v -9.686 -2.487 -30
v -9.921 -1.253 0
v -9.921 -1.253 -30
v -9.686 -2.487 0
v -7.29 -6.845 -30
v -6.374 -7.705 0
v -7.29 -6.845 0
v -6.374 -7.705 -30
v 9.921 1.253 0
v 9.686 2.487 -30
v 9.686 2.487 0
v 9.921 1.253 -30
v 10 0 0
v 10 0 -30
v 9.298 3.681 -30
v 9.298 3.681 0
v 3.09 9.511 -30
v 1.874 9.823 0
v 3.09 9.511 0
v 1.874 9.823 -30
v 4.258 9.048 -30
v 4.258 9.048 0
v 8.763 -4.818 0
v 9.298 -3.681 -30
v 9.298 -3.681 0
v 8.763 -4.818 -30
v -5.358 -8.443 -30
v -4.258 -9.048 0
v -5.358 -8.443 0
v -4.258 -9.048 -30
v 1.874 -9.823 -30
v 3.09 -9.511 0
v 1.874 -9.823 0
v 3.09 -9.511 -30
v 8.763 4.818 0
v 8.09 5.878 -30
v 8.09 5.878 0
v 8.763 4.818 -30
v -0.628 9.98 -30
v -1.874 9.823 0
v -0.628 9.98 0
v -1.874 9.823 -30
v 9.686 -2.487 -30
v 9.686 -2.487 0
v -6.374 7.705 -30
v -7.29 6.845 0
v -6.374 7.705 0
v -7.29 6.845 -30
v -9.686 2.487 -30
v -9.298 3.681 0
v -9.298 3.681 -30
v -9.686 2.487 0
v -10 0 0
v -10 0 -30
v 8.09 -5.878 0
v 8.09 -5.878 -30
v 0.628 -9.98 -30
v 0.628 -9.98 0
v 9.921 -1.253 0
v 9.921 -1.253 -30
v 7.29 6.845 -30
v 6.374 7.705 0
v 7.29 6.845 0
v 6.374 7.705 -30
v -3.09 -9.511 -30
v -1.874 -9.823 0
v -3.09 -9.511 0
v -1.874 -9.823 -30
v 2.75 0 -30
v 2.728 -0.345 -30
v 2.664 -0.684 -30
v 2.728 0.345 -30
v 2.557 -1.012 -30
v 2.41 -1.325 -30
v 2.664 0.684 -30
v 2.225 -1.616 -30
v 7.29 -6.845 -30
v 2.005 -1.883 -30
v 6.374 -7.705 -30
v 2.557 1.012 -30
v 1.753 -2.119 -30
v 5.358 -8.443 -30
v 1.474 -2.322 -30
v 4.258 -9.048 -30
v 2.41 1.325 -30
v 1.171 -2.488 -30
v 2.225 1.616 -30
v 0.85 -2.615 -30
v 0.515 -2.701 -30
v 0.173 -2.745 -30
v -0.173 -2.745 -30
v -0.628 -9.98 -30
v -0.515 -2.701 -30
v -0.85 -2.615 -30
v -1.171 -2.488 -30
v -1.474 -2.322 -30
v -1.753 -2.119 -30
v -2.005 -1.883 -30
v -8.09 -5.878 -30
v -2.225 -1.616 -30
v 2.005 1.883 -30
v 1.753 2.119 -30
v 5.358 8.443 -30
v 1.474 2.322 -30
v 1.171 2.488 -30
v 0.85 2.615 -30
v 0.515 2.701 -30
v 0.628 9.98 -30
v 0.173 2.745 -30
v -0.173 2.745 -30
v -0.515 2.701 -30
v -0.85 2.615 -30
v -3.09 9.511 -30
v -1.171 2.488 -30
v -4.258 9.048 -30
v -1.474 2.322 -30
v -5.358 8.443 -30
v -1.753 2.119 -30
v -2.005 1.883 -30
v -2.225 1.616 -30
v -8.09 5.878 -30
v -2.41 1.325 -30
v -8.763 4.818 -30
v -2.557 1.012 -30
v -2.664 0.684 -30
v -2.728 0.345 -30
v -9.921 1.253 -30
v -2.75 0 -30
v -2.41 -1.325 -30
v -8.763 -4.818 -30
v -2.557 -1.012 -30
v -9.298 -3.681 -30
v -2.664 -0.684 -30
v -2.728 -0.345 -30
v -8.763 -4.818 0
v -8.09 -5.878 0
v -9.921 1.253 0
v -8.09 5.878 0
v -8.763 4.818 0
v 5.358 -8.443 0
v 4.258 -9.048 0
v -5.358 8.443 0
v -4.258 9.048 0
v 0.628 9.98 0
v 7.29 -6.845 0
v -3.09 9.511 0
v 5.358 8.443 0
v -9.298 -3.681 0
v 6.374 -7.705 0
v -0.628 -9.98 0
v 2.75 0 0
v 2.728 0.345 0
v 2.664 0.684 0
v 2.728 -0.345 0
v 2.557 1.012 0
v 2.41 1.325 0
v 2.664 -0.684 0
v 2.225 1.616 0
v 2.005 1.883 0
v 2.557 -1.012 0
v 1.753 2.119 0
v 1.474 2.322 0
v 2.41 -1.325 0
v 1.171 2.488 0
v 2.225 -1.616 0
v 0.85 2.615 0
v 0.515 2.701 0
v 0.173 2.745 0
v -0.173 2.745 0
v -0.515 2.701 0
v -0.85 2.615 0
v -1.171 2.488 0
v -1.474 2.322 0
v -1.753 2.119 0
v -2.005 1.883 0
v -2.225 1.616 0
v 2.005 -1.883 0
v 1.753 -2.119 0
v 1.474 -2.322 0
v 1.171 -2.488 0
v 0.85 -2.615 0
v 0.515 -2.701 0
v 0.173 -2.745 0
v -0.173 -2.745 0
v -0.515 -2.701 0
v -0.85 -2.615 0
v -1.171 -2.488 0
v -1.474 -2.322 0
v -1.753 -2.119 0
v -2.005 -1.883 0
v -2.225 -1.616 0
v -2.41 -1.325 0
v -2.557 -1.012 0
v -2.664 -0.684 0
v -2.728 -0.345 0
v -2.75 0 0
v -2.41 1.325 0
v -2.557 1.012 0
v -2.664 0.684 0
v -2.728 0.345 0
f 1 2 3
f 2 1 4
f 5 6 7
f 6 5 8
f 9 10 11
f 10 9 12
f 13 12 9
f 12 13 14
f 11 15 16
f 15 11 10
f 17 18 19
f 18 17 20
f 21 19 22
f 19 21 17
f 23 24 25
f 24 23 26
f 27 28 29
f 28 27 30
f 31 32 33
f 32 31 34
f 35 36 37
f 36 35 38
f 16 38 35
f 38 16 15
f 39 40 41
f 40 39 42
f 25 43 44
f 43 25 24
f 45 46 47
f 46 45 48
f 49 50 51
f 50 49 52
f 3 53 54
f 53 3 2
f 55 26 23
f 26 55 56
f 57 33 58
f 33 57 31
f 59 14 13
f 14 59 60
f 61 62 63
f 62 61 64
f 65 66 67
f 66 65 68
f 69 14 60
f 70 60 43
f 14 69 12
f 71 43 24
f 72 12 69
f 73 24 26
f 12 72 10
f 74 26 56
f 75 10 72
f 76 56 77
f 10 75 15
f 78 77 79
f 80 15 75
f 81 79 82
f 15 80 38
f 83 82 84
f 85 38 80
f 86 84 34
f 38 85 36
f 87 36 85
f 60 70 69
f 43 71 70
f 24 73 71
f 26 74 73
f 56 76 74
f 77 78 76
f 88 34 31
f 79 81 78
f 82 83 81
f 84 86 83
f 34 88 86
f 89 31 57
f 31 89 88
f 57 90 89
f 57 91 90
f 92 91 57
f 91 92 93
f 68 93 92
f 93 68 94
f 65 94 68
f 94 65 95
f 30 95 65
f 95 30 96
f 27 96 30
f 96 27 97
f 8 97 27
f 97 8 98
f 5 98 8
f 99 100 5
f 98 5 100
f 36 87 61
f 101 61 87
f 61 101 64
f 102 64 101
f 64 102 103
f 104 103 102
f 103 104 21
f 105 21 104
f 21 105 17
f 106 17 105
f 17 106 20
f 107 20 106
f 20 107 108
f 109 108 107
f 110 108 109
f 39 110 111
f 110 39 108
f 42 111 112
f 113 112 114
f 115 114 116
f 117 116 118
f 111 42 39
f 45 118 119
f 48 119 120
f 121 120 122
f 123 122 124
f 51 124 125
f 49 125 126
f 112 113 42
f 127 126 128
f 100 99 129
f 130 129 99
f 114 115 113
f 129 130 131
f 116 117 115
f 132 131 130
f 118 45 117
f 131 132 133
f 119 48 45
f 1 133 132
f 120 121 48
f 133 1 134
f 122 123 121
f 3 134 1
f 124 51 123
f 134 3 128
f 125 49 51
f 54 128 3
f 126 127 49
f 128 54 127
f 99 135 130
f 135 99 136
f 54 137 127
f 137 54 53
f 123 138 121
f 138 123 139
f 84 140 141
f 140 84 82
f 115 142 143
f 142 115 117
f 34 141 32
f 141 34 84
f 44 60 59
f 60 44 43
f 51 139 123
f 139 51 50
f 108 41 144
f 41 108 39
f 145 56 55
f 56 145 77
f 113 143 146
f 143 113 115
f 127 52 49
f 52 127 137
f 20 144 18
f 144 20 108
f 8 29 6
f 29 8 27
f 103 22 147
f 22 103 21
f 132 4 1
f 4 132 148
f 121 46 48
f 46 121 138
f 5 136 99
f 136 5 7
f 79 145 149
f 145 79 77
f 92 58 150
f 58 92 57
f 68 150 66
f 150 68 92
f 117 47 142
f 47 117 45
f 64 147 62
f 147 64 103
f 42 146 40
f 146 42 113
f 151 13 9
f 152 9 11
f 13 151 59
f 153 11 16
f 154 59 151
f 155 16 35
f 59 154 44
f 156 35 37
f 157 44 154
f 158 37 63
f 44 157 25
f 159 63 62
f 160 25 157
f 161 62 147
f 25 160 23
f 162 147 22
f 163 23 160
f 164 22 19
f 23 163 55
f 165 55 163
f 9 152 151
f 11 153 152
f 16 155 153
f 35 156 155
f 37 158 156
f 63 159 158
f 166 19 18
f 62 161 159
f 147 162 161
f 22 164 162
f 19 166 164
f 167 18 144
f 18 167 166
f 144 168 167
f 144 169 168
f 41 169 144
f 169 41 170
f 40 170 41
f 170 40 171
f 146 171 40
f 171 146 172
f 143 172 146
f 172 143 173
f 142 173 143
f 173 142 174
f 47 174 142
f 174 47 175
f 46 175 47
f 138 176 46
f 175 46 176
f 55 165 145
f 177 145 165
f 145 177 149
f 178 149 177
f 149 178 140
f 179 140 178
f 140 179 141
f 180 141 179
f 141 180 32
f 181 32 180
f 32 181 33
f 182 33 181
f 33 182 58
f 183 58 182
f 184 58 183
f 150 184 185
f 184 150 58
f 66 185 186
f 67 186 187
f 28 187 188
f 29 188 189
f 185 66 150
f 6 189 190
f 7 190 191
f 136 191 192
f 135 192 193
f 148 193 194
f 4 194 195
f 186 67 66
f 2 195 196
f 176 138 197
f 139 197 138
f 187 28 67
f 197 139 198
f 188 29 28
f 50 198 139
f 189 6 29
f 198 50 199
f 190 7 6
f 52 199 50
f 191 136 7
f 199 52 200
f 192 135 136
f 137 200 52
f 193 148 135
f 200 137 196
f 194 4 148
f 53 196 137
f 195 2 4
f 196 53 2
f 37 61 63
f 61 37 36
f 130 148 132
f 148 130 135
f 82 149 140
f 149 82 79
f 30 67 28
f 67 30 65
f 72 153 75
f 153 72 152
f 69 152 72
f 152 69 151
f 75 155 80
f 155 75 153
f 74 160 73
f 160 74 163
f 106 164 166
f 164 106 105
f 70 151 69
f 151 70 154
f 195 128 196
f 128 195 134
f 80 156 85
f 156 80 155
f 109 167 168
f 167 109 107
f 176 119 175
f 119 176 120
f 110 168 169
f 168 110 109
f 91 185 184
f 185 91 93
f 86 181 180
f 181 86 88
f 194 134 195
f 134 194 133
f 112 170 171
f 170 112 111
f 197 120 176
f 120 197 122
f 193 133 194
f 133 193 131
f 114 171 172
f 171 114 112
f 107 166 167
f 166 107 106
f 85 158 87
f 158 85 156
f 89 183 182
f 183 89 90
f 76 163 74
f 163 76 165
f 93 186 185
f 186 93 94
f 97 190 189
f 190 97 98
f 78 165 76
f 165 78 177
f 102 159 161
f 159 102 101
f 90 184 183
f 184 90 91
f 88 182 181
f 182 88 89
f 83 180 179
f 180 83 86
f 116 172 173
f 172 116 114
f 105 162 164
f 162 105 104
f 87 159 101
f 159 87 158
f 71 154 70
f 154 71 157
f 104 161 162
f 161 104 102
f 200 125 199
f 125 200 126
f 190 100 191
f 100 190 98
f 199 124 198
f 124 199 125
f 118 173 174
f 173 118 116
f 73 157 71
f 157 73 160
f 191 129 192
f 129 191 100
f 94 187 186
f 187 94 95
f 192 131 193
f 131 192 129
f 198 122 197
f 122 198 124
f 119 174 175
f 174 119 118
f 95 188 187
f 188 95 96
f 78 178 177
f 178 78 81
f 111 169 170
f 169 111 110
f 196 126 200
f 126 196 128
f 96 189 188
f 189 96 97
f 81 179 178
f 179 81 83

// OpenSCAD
$fn = 50;


difference() {
	union() {
		translate(v = [0, 0, -30.0000000000]) {
			cylinder(h = 30, r = 10.0000000000);
		}
	}
	union() {
		#translate(v = [0, 0, -30]) {
			cylinder(h = 30, r = 2.7500000000);
		}
	}
}
